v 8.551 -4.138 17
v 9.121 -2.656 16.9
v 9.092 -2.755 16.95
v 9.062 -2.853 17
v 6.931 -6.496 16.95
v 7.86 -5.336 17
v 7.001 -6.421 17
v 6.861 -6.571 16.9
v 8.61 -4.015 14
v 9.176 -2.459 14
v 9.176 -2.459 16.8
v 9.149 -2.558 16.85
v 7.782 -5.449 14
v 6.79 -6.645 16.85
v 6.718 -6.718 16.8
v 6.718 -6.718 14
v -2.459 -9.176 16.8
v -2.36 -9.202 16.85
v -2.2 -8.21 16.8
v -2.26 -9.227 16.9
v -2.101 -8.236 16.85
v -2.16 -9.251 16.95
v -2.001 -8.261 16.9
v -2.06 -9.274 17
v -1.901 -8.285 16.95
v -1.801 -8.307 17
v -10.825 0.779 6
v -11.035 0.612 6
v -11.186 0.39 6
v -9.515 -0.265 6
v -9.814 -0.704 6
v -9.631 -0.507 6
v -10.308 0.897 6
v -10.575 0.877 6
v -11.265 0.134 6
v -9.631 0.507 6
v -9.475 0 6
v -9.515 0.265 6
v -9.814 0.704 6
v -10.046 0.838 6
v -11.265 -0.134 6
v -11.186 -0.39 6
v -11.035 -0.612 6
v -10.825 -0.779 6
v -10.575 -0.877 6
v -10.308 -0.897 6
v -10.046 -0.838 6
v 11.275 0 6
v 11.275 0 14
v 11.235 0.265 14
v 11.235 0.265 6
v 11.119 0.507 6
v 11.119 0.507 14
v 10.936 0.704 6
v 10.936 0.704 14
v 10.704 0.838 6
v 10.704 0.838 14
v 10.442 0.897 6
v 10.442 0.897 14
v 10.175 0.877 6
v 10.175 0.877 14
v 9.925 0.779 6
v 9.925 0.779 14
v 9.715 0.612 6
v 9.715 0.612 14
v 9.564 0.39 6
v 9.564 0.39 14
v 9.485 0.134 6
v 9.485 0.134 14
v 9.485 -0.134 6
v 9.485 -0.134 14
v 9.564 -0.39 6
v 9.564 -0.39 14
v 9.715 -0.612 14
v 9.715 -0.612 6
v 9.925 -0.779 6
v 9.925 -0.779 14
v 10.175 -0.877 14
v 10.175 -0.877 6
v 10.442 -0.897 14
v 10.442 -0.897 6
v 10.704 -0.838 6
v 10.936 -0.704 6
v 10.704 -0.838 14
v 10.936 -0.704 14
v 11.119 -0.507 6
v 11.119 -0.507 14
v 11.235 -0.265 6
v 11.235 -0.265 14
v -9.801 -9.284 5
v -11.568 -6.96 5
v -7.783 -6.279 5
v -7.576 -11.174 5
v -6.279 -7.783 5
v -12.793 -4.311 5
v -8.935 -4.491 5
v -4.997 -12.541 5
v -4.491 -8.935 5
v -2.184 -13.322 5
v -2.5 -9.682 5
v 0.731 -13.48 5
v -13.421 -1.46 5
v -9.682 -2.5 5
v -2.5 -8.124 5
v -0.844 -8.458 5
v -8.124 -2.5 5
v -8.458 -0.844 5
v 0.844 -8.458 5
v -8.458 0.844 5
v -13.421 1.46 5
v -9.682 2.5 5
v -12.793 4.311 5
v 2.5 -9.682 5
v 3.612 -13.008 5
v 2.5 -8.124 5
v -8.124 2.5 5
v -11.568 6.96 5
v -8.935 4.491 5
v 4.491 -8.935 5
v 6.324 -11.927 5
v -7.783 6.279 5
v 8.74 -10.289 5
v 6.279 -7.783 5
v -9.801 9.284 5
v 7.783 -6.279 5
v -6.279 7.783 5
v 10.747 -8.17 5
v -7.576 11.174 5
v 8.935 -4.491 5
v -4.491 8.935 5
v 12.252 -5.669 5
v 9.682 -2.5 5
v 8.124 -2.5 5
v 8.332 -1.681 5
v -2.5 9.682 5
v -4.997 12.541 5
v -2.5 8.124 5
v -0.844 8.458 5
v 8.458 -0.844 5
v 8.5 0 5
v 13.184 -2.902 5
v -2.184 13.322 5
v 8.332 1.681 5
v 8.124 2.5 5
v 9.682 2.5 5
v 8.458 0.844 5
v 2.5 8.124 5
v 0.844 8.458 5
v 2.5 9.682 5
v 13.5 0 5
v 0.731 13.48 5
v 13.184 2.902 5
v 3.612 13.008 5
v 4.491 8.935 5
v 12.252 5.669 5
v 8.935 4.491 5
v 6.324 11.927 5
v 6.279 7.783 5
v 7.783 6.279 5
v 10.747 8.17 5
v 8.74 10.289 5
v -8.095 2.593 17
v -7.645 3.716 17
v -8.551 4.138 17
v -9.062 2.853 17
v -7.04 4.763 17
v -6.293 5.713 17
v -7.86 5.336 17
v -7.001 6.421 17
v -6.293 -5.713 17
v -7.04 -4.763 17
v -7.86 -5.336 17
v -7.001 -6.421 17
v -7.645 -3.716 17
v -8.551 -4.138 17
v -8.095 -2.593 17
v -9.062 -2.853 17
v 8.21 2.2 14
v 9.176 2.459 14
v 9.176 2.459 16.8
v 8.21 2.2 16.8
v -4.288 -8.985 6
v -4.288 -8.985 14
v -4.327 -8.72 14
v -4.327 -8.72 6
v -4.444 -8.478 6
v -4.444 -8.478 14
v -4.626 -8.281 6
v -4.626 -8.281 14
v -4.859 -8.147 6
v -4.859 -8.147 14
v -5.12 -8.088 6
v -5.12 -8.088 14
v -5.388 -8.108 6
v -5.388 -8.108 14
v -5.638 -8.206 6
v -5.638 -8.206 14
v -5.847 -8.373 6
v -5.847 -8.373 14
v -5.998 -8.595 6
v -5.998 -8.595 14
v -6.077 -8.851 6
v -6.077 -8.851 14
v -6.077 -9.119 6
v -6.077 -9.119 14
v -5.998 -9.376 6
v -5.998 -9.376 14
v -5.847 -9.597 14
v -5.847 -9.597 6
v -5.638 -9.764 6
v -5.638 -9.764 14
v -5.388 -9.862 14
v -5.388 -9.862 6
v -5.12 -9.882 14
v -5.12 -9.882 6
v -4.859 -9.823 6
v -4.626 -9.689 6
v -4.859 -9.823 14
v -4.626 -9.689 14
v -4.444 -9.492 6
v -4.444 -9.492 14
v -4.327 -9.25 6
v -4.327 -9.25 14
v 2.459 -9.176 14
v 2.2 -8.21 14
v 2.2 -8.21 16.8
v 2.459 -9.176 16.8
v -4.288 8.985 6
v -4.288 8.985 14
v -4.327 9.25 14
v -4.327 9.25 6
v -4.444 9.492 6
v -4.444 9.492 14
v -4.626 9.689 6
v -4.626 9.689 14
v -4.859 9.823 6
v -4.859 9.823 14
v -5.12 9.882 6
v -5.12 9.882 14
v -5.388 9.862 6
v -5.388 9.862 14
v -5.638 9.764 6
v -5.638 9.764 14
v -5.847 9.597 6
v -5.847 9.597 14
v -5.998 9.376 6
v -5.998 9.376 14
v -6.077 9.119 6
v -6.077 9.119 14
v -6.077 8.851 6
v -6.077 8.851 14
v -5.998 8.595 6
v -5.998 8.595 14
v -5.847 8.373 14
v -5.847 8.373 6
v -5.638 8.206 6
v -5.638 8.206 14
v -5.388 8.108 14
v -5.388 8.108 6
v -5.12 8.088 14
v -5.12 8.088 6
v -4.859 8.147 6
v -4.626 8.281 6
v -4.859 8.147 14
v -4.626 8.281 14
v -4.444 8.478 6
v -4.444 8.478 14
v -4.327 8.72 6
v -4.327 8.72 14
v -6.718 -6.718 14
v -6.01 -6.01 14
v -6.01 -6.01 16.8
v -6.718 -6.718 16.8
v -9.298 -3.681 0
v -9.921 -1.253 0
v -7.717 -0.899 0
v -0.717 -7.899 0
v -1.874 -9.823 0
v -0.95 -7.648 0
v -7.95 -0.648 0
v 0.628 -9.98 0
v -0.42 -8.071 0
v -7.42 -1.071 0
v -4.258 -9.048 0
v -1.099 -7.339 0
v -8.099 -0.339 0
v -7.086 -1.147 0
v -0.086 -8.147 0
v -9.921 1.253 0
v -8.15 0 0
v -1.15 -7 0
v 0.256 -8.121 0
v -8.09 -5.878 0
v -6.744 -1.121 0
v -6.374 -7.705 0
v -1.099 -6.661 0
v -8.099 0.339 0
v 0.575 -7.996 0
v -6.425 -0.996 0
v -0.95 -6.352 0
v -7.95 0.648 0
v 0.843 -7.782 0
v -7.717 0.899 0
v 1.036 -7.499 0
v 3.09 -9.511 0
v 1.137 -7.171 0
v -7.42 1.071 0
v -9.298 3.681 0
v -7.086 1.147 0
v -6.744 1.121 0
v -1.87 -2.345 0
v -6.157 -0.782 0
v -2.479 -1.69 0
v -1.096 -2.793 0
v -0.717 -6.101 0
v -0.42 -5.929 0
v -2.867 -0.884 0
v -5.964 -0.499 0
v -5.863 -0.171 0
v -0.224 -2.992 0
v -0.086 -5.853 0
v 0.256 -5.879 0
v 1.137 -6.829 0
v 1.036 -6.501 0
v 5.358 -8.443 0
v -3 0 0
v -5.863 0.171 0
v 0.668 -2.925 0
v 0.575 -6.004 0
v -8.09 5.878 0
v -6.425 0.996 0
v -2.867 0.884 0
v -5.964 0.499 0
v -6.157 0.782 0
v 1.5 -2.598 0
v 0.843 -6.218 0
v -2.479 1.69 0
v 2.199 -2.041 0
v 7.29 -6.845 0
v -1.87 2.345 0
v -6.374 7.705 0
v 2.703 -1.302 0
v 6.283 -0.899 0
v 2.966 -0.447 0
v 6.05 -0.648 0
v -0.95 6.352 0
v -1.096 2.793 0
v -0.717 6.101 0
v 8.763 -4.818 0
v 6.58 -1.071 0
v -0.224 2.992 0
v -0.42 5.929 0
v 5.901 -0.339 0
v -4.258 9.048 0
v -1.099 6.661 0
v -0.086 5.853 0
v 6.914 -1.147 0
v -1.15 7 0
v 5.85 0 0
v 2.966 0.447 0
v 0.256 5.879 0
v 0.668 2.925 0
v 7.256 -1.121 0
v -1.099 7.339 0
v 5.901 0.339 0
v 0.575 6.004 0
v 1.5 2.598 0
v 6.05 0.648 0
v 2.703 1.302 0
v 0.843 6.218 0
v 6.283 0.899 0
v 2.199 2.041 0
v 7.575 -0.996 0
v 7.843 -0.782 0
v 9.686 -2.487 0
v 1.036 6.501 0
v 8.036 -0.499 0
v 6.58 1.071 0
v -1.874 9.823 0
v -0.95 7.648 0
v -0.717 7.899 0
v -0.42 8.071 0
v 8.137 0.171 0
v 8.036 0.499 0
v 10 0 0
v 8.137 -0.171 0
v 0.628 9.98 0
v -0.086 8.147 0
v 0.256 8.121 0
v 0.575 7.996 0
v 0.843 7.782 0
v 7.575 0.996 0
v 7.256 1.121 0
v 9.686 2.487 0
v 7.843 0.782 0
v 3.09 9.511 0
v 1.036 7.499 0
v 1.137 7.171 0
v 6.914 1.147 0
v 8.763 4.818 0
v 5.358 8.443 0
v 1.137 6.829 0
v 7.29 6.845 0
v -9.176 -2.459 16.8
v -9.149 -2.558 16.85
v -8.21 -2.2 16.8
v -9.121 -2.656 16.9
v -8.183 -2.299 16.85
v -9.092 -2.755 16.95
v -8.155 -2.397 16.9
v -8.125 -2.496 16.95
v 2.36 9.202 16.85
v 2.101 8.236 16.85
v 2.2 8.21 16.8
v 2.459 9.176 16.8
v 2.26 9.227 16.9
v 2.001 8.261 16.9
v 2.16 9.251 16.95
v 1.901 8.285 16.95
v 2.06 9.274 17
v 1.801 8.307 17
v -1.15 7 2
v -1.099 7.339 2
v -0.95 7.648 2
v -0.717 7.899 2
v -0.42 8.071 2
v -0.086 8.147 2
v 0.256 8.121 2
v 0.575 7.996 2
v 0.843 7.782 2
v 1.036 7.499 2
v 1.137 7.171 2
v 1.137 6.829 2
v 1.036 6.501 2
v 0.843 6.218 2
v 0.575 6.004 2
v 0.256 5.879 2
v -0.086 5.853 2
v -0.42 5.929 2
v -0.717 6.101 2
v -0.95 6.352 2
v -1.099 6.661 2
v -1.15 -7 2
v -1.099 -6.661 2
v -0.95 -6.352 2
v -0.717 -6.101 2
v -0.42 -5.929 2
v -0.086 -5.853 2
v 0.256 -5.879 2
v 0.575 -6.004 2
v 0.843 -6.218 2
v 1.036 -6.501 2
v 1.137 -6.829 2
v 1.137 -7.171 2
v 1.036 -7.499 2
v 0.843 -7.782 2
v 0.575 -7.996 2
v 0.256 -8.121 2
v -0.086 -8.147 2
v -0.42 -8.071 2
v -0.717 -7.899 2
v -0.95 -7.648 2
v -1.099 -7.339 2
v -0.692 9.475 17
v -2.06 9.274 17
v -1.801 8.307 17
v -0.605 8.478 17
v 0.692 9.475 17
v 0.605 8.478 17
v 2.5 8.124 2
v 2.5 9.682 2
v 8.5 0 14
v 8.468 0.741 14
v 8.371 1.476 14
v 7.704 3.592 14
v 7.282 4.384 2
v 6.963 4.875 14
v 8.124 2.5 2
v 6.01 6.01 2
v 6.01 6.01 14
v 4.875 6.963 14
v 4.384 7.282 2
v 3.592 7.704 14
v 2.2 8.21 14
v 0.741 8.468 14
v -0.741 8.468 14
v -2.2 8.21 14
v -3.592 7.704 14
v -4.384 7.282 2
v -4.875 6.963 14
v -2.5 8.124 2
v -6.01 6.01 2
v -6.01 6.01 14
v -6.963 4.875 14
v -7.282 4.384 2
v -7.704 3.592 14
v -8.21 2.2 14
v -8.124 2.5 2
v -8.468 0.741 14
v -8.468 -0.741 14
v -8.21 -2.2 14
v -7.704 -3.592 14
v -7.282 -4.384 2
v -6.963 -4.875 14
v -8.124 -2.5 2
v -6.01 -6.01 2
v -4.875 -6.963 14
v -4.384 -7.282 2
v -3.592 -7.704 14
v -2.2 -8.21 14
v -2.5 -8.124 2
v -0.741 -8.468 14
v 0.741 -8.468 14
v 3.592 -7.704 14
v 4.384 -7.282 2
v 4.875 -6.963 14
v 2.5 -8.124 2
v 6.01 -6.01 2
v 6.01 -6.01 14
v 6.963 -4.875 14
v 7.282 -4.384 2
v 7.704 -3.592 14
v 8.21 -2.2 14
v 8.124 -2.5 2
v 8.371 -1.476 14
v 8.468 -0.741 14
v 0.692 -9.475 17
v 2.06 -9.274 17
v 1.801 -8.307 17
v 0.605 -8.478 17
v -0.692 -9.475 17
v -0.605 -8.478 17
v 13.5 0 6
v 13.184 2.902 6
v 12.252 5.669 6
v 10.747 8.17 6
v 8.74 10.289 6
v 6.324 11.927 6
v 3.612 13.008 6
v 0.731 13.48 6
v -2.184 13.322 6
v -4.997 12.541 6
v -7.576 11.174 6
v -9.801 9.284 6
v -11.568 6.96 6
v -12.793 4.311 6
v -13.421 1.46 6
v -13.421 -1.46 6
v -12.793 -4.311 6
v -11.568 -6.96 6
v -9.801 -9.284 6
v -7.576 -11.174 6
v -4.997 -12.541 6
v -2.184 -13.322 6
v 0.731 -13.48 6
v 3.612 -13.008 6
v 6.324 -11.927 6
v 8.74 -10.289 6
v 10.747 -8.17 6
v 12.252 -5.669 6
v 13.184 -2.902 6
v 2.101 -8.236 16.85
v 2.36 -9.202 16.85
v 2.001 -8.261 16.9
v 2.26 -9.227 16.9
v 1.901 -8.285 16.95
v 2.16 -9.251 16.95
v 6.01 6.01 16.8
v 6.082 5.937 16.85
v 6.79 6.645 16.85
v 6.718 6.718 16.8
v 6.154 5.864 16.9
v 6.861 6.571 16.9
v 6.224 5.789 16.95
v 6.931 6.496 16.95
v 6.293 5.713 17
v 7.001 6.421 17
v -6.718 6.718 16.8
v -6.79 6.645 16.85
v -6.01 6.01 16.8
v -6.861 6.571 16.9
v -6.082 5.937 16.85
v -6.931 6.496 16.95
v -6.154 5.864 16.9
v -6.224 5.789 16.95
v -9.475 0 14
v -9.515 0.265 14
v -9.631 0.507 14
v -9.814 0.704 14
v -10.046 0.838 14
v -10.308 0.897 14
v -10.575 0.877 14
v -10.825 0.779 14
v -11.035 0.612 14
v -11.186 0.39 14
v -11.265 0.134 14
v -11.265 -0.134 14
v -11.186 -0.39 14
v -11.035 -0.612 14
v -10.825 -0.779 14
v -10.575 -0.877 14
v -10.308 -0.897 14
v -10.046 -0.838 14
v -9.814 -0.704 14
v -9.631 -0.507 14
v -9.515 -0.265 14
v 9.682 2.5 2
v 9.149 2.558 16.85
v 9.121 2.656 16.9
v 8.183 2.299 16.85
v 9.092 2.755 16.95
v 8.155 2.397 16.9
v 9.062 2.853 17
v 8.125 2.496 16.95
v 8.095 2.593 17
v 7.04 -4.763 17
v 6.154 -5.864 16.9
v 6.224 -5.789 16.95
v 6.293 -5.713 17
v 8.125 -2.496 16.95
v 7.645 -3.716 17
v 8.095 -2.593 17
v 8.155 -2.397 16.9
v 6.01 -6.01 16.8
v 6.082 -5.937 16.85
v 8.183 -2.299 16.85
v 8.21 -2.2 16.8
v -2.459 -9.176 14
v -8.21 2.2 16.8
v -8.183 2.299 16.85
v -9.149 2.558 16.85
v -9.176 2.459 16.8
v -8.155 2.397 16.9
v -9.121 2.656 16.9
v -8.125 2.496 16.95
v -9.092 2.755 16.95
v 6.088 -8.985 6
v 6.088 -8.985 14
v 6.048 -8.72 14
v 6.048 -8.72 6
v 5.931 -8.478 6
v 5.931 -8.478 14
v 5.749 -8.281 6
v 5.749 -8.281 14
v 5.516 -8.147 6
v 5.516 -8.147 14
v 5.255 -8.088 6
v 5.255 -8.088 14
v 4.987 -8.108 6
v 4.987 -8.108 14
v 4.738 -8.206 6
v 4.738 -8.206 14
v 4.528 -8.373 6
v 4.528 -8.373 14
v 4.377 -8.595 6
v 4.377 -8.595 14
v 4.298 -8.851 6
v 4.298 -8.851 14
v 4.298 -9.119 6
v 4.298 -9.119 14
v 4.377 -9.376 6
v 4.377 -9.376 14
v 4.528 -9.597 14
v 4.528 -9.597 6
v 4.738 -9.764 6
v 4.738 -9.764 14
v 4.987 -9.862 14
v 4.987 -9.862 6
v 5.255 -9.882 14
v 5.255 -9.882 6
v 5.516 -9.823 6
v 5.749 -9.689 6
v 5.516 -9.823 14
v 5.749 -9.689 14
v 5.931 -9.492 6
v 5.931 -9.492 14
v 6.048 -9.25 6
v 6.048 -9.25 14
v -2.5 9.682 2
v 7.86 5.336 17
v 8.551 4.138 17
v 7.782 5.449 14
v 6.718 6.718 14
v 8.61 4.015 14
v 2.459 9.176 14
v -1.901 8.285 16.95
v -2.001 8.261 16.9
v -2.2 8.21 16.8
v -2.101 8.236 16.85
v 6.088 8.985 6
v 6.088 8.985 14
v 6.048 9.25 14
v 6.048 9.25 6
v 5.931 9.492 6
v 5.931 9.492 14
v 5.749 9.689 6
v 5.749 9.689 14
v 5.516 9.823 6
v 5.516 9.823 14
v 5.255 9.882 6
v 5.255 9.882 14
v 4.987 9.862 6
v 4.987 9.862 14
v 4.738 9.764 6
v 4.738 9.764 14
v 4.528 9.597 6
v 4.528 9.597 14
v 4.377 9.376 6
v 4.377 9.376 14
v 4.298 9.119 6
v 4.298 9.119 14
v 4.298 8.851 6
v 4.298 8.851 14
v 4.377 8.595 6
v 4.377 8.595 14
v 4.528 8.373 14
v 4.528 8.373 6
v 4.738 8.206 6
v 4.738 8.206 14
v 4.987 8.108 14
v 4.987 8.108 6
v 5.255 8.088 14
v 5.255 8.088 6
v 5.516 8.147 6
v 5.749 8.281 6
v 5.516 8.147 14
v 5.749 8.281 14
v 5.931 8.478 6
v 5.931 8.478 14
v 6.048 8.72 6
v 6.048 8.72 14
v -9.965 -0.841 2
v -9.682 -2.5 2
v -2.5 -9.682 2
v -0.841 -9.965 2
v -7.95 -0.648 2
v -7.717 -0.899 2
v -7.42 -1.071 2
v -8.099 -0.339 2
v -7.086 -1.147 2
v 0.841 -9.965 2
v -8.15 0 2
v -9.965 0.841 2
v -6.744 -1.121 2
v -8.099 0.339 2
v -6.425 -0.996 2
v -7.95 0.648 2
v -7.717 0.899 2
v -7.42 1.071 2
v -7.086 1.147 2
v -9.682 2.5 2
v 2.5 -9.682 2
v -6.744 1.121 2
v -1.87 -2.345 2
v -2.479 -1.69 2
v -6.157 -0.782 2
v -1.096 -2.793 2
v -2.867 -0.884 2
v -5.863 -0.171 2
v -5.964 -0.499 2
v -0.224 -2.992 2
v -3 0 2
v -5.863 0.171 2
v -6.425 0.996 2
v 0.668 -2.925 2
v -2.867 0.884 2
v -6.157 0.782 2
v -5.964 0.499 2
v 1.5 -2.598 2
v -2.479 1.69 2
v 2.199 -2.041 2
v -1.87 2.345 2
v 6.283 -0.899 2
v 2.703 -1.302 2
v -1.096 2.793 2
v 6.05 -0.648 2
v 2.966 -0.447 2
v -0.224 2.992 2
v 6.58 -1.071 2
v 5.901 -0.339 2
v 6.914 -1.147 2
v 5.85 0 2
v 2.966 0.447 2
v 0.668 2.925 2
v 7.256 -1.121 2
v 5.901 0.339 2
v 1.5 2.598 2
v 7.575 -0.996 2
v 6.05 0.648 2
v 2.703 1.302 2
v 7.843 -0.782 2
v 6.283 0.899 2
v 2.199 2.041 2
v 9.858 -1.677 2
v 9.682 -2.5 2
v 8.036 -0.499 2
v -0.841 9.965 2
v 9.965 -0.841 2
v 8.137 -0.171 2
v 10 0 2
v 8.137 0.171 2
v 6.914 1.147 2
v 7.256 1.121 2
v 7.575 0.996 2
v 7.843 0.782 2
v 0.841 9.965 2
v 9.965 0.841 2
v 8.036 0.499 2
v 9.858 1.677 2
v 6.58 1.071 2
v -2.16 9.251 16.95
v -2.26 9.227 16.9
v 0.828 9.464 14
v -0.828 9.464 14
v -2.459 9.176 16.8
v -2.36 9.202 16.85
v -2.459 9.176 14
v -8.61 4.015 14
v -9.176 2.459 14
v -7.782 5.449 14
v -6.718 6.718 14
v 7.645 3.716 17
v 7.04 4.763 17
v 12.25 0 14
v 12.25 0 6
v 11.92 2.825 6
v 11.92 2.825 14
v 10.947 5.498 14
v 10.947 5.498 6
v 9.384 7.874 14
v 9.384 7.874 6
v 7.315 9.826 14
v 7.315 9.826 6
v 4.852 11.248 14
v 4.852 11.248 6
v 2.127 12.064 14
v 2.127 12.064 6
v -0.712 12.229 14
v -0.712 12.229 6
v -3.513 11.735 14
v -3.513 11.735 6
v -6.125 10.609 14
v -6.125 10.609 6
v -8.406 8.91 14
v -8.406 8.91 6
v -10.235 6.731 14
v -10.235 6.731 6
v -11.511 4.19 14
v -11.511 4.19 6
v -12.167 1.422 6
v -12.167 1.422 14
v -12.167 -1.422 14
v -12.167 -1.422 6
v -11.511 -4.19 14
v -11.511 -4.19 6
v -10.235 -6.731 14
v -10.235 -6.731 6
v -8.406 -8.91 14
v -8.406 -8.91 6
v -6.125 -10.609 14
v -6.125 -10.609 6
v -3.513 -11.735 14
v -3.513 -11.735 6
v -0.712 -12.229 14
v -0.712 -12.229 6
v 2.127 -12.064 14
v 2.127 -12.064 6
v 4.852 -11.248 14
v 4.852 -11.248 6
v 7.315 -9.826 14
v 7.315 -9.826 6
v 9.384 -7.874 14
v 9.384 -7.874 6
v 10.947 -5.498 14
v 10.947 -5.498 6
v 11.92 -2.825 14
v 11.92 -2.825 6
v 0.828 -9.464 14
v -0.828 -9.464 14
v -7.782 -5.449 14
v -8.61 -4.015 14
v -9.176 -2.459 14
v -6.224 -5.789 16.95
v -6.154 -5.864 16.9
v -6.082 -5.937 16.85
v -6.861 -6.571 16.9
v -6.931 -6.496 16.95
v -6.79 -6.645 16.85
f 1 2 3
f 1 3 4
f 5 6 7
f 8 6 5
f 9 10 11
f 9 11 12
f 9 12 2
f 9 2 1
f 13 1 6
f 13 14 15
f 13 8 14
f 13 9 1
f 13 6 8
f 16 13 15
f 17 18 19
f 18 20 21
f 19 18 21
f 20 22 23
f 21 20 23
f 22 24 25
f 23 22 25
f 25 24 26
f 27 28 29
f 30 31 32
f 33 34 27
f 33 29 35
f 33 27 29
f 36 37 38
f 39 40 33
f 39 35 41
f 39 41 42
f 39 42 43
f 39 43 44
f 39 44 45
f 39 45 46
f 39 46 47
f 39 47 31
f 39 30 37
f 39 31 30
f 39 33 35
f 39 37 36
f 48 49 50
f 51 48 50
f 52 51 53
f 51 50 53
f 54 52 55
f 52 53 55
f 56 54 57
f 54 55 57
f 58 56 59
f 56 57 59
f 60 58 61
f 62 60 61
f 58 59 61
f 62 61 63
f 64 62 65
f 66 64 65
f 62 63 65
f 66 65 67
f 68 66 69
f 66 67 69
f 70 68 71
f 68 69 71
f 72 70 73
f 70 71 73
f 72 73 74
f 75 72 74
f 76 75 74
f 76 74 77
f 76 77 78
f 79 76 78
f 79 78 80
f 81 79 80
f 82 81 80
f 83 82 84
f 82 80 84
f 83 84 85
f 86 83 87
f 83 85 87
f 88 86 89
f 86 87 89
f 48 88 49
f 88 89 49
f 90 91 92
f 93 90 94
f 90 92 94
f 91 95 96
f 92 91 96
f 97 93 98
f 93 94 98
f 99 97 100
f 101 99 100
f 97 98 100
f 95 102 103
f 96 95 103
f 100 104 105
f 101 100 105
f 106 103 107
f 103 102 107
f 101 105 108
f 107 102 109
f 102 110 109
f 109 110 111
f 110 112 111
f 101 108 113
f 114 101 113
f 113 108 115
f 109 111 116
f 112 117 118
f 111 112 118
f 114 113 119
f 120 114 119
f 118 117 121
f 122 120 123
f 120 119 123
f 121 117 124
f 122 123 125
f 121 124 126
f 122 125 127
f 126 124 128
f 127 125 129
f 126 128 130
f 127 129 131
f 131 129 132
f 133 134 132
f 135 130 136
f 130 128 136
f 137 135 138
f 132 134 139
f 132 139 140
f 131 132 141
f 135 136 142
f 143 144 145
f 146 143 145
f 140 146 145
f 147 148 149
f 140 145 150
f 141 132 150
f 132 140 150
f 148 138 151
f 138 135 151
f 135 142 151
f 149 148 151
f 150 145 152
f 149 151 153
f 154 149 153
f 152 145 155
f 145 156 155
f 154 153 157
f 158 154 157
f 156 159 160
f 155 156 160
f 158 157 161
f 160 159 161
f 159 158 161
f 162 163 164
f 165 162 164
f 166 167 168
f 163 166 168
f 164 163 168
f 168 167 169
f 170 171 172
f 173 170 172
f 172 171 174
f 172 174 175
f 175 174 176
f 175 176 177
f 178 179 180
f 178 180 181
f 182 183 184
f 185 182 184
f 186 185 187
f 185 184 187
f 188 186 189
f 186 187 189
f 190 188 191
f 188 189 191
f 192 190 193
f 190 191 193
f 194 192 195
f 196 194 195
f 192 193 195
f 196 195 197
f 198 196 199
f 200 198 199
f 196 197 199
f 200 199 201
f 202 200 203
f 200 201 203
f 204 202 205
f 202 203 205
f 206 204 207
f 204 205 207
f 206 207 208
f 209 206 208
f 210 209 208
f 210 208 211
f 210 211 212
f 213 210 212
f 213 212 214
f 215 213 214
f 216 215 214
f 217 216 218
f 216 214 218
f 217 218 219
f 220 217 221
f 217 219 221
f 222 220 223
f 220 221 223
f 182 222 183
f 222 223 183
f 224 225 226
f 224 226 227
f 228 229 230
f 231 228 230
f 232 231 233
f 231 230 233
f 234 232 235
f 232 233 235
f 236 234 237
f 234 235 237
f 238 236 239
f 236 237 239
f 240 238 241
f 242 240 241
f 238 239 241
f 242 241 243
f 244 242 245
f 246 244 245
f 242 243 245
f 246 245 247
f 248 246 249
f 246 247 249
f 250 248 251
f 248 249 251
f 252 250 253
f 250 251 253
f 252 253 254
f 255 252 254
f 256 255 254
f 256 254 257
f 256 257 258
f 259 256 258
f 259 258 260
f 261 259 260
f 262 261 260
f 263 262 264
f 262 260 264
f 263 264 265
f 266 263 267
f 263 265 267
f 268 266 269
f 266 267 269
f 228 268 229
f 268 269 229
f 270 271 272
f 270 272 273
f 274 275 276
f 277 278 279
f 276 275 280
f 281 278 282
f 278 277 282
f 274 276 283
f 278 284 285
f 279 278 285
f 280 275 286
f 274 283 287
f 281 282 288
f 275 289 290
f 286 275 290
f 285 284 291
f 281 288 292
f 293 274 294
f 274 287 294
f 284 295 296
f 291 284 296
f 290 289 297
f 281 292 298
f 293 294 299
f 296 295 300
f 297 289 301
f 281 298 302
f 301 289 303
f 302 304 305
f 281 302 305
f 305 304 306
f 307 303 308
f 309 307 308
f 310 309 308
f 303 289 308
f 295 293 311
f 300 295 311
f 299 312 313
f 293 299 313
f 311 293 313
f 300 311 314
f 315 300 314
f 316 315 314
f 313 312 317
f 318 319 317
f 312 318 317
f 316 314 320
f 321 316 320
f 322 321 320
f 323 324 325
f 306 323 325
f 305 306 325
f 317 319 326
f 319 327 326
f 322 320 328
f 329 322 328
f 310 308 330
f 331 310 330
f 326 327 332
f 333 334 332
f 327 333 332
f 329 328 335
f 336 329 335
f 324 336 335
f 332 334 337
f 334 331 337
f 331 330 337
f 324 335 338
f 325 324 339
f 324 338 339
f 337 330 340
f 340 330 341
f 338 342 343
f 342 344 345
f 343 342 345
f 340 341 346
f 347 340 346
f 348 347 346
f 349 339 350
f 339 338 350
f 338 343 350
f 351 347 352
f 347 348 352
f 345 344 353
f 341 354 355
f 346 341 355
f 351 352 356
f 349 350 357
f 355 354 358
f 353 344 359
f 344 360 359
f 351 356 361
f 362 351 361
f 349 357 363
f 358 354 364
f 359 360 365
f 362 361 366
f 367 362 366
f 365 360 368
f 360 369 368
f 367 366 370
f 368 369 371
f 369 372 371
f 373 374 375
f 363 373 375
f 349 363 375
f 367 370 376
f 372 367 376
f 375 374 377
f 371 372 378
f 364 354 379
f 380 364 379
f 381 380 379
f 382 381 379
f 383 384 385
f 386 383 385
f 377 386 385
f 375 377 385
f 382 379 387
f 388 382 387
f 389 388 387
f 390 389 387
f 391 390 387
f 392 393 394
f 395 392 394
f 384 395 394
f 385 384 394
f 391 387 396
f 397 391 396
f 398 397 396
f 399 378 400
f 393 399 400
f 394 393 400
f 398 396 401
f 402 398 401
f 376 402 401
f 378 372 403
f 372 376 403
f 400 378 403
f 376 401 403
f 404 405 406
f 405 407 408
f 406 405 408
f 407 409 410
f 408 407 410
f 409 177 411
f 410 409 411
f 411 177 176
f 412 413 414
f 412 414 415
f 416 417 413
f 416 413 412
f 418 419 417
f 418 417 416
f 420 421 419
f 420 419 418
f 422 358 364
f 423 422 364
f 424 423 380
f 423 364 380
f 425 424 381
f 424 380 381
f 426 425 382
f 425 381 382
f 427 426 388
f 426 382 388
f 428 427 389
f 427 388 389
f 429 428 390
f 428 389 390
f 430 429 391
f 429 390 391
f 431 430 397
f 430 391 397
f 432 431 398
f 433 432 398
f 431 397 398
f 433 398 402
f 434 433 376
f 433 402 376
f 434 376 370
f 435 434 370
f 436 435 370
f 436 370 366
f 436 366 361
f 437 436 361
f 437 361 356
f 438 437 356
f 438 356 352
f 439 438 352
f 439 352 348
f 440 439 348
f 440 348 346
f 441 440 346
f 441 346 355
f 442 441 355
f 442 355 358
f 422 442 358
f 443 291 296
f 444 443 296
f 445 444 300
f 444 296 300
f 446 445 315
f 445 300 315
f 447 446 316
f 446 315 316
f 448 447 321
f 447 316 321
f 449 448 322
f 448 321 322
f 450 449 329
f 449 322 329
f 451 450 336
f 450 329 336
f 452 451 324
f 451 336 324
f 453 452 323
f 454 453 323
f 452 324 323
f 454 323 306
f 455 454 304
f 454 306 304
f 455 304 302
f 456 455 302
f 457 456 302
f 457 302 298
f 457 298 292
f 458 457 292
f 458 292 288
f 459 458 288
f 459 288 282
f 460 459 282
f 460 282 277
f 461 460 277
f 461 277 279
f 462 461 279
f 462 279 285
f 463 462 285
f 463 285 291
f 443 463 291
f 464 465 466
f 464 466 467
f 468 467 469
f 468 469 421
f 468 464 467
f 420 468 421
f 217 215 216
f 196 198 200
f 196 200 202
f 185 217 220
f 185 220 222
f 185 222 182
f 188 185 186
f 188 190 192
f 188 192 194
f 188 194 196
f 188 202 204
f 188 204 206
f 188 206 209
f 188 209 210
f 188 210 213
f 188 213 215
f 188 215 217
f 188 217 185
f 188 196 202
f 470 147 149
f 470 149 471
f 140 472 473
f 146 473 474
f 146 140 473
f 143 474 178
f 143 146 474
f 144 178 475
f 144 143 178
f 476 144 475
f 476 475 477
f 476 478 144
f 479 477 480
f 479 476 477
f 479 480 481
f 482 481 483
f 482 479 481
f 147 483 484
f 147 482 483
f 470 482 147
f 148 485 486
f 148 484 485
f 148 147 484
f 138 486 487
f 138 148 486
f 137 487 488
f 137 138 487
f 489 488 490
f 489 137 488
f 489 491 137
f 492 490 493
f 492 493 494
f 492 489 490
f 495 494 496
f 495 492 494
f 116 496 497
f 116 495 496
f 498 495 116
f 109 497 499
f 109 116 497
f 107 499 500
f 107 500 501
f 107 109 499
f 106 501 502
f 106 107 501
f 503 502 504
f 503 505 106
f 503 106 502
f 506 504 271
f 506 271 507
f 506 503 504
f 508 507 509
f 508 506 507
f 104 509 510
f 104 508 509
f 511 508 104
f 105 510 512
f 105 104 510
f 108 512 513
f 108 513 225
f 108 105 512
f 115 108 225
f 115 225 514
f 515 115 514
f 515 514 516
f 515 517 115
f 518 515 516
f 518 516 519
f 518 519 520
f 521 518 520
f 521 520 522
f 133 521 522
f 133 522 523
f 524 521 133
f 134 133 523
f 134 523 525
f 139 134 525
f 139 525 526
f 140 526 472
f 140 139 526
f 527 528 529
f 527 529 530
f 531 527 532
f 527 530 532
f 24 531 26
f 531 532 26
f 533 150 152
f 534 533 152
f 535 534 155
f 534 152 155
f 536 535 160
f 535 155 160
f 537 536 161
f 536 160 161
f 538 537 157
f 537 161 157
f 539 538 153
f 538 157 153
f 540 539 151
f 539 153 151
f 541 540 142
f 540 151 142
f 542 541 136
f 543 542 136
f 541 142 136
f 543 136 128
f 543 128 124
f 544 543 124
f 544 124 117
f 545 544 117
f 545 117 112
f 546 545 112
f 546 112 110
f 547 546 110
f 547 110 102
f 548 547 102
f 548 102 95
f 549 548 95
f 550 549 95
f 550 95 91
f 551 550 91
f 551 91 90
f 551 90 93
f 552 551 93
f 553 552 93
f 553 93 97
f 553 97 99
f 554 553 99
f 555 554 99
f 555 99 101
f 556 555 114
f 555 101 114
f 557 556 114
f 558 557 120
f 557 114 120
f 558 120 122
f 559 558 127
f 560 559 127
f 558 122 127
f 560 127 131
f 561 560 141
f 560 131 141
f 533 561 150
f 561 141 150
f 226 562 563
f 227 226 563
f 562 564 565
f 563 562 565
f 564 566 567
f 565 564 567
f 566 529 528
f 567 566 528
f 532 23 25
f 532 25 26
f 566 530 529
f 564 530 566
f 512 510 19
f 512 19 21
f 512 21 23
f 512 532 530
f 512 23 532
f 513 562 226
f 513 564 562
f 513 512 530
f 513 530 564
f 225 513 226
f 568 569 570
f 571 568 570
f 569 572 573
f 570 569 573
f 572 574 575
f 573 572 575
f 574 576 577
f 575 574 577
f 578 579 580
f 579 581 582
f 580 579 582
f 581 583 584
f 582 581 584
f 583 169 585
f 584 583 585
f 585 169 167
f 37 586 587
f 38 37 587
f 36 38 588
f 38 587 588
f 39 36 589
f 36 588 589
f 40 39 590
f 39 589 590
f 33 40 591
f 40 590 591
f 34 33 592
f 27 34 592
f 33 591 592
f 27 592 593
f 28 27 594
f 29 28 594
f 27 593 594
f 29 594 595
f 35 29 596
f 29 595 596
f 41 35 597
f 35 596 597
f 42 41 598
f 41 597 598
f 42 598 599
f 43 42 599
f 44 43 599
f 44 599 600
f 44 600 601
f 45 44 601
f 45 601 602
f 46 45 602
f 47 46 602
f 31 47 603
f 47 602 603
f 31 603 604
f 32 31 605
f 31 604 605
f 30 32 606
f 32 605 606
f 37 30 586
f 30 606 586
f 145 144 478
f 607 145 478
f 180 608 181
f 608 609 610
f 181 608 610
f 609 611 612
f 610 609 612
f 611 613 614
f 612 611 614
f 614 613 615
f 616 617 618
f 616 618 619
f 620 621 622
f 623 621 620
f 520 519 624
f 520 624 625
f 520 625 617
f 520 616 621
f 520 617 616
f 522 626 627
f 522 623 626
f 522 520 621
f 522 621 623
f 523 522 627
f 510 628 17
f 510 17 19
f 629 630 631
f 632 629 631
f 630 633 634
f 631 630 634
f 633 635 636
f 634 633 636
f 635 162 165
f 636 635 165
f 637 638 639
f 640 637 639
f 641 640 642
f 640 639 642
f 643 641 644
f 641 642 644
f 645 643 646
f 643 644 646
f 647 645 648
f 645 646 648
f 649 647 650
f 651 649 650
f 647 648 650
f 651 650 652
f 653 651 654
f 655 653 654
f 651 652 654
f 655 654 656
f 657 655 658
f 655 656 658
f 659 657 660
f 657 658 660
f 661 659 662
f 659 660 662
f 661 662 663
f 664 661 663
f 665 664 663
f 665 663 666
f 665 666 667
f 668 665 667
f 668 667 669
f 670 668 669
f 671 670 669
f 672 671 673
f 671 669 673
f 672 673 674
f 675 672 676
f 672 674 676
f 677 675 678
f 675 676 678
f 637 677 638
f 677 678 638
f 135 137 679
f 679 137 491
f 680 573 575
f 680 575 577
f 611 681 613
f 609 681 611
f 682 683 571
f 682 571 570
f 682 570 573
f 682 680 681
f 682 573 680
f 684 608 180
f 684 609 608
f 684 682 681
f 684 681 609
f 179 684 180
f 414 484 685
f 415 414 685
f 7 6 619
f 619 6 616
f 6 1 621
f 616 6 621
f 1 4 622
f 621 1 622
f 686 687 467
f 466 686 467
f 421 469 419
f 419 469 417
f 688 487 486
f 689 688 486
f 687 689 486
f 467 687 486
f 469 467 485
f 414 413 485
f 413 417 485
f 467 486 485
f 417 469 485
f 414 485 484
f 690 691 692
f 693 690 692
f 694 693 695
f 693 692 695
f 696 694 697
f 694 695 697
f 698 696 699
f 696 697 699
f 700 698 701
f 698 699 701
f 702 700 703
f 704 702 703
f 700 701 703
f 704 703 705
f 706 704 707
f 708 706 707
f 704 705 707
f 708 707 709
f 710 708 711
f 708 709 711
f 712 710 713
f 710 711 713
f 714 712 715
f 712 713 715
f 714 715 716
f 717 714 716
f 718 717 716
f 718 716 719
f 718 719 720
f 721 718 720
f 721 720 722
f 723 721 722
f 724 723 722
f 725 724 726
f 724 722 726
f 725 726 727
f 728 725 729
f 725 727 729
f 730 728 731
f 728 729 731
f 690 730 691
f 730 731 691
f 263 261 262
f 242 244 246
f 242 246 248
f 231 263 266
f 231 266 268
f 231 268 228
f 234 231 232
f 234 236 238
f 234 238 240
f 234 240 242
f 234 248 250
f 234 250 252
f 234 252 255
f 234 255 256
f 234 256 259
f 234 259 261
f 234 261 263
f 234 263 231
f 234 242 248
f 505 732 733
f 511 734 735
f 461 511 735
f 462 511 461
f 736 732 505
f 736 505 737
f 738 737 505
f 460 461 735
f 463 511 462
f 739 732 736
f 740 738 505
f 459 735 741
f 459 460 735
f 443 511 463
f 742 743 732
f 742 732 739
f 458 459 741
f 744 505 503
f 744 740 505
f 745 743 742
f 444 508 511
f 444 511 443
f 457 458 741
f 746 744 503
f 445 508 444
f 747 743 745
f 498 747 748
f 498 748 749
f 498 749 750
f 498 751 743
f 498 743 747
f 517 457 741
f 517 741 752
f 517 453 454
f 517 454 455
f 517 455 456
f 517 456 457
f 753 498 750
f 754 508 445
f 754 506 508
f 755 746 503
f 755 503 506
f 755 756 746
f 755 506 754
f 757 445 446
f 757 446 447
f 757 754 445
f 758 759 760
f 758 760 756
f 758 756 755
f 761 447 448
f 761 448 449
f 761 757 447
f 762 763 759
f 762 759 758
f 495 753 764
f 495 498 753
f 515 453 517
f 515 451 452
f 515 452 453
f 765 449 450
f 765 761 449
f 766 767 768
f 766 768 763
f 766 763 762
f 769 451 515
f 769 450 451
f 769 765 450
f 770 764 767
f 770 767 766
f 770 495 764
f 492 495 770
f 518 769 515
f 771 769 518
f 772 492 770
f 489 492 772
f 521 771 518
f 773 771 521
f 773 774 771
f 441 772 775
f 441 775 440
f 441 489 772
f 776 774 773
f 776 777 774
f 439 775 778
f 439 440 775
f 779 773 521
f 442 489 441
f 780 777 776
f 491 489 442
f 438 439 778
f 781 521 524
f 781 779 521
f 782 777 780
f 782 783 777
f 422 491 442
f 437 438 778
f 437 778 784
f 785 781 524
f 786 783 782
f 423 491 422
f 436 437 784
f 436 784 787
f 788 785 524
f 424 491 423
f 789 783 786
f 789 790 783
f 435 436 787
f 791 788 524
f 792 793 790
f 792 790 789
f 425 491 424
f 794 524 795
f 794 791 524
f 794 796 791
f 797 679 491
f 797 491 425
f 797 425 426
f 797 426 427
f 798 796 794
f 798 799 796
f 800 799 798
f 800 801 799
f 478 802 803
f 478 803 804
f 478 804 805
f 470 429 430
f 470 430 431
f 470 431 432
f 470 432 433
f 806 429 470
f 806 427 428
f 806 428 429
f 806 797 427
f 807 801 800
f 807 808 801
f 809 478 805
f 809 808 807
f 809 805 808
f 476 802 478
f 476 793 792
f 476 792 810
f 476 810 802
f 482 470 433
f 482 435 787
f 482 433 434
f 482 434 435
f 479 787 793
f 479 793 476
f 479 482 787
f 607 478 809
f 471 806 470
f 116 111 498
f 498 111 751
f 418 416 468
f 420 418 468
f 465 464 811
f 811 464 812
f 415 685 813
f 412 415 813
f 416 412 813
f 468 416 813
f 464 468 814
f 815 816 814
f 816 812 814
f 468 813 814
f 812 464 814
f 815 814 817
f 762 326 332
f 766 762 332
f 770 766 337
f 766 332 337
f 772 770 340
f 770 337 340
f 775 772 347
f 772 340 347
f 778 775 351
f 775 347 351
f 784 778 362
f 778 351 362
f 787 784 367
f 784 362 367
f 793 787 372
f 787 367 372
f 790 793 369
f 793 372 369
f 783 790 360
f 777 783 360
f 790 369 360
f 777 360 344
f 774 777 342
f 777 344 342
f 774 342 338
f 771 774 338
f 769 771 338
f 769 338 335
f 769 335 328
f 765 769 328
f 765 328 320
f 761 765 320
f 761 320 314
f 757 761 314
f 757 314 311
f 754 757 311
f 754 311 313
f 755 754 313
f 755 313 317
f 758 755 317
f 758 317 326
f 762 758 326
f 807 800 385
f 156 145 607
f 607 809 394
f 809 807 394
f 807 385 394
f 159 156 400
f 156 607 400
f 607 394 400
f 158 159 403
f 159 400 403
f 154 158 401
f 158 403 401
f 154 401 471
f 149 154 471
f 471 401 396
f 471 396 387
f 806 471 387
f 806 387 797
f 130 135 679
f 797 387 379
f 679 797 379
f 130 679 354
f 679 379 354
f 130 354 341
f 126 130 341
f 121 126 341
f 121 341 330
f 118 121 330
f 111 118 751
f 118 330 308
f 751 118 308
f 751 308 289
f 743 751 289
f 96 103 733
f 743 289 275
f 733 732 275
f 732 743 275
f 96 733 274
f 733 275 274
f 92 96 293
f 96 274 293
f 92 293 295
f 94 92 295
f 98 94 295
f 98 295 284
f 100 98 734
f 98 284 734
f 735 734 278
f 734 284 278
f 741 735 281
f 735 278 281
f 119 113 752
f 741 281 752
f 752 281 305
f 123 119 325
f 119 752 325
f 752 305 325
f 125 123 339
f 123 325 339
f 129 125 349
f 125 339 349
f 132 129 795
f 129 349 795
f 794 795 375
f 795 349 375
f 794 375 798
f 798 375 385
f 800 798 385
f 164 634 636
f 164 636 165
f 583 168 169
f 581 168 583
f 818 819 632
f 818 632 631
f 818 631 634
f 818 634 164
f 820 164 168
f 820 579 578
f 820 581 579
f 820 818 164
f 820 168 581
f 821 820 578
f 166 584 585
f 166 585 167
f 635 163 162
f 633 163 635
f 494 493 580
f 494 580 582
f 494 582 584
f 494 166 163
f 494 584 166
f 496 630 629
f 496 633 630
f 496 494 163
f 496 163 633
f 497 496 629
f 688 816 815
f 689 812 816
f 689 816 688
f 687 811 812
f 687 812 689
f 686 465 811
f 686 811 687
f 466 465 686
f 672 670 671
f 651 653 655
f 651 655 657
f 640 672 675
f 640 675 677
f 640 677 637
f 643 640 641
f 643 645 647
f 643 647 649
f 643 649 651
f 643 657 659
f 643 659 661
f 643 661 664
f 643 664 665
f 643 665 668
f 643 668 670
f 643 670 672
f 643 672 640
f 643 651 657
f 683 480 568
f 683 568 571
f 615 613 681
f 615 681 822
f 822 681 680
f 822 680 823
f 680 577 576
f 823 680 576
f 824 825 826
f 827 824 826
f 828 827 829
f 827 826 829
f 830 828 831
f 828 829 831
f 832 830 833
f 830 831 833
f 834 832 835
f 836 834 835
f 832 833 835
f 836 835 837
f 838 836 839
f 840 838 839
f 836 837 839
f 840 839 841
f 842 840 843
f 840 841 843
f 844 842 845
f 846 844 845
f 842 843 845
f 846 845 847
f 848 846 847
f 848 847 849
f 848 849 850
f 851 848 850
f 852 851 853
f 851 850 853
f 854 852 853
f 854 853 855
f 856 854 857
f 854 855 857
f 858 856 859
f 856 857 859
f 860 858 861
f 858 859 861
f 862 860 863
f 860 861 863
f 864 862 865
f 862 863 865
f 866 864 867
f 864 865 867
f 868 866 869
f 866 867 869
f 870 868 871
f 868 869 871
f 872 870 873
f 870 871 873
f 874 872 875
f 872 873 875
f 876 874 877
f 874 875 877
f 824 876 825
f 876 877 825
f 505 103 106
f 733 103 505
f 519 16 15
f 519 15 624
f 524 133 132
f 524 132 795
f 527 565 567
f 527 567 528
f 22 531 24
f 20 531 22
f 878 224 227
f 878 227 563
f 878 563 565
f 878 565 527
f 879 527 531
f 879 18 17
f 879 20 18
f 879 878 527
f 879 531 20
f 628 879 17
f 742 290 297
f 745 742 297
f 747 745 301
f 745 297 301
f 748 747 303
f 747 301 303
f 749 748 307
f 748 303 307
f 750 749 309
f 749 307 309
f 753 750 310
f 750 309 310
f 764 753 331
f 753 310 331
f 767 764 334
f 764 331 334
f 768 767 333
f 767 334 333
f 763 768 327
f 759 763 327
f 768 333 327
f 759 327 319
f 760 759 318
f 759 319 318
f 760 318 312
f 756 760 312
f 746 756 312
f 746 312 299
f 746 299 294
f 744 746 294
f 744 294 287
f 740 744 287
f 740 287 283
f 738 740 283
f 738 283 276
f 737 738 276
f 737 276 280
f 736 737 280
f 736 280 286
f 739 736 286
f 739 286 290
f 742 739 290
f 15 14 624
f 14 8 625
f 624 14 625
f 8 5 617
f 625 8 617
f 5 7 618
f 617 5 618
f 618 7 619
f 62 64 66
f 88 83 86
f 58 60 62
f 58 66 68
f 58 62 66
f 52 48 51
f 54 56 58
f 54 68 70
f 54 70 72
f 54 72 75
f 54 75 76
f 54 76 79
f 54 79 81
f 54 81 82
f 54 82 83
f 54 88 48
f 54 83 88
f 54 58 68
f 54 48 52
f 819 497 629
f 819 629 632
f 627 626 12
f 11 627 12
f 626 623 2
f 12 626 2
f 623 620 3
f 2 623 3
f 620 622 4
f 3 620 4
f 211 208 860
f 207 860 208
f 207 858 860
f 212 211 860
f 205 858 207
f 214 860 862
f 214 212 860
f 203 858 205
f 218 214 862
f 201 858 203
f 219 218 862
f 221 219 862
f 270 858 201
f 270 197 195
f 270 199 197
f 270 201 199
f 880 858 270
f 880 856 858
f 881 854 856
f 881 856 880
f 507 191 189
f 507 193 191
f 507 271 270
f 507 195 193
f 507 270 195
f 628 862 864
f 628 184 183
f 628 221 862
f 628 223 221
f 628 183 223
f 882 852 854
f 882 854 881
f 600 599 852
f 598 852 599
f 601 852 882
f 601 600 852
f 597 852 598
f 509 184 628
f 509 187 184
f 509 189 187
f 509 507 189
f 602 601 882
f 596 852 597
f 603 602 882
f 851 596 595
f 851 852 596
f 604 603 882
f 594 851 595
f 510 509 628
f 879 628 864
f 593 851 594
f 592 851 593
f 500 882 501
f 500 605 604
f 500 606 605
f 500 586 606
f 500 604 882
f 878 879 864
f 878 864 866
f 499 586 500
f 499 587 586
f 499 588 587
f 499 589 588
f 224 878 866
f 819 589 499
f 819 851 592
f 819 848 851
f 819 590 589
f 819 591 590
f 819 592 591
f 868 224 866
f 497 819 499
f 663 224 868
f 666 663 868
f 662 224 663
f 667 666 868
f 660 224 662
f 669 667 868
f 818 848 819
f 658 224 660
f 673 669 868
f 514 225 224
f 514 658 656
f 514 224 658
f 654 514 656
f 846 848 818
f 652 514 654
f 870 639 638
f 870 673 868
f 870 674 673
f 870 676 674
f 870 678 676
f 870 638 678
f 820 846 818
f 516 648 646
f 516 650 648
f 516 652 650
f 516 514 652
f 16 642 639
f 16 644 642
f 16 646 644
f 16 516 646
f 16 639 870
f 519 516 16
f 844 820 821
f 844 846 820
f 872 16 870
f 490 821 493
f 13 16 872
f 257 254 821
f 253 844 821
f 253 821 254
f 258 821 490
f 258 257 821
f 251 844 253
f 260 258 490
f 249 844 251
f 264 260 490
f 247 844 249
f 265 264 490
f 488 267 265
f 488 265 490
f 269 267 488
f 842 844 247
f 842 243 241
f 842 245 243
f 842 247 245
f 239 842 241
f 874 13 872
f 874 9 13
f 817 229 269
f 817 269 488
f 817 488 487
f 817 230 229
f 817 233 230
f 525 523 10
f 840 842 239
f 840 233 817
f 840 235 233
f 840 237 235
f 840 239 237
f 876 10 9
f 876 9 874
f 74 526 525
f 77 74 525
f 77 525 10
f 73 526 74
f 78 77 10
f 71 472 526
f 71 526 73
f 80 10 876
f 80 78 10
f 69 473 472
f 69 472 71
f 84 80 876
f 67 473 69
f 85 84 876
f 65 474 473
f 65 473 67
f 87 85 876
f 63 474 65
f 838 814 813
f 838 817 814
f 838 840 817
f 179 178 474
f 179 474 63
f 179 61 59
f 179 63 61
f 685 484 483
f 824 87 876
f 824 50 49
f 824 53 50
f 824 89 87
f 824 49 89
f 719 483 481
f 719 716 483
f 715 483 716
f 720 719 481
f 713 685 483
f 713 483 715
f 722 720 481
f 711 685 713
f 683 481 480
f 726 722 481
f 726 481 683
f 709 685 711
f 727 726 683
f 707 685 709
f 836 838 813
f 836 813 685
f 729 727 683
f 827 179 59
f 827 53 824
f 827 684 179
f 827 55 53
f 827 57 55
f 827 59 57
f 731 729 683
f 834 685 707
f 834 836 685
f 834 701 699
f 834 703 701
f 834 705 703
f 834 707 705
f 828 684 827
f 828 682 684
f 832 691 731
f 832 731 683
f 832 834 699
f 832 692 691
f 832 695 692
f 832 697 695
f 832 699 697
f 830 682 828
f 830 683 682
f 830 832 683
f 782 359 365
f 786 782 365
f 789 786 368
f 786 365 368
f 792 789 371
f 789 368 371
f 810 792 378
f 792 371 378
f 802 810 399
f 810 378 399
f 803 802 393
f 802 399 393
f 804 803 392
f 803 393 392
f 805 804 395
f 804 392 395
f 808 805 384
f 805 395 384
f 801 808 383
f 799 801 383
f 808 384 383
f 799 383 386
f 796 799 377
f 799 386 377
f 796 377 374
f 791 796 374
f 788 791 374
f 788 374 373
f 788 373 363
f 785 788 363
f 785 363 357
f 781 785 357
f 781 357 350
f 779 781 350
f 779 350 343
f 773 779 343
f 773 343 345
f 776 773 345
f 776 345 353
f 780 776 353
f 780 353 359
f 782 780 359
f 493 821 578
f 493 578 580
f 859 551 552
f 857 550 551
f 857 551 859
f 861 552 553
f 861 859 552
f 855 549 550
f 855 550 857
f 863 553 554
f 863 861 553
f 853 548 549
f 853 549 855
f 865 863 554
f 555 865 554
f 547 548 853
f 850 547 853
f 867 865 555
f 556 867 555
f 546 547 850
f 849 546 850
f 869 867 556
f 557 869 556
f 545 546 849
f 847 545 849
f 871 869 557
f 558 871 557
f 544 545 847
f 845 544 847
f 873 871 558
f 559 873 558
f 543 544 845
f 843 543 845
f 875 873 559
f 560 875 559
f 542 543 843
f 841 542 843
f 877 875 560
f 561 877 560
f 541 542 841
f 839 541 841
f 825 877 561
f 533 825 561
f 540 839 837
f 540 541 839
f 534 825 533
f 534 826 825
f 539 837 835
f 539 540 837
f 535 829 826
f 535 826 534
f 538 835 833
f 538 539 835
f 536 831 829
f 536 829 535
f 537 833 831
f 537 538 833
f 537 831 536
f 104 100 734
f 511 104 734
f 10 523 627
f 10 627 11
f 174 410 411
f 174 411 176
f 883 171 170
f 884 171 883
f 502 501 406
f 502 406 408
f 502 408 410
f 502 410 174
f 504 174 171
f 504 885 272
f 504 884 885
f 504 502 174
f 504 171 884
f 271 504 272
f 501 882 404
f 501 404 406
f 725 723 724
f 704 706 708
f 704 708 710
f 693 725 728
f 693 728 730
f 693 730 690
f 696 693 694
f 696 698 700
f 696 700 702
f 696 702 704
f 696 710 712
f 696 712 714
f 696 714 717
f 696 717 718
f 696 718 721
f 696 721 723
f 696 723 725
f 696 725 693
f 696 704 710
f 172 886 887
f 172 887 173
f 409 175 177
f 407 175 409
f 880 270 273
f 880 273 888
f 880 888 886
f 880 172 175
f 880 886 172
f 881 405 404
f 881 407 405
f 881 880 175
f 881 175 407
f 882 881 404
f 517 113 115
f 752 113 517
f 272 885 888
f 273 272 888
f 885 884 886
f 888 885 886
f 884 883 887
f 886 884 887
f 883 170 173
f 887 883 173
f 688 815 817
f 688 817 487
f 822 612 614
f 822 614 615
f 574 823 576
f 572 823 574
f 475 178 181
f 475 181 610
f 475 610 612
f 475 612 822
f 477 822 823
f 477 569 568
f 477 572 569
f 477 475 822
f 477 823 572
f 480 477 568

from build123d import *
from OCP.BRepFilletAPI import BRepFilletAPI_MakeChamfer

# Parameters (mm, degrees)
SKETCH_1_R               = 10
EXTRUDE_1_DEPTH          = 2
SKETCH_2_R               = 10
SKETCH_2_R_2             = 8.5
EXTRUDE_2_DEPTH          = 3
SKETCH_4_R               = 13.5
SKETCH_4_R_2             = 8.5
EXTRUDE_3_DEPTH          = 1
SKETCH_5_R               = 12.25
SKETCH_5_R_2             = 8.5
EXTRUDE_4_DEPTH          = 8
SKETCH_6_R               = 0.9
CUT_EXTRUDE_1_DEPTH      = 8
SKETCH_7_R               = 3
SKETCH_7_R_2             = 1.15
CUT_EXTRUDE_2_DEPTH      = 24.674881204
CUT_EXTRUDE_3_DEPTH      = 24.674881204
CUT_EXTRUDE_3_DEPTH_BACK = 24.674881204
SKETCH_8_W               = 5
SKETCH_8_H               = 3
CUT_EXTRUDE_4_DEPTH      = 24.674881204
CUT_EXTRUDE_4_DEPTH_BACK = 24.674881204
SKETCH_9_W               = 3
SKETCH_9_H               = 5
EXTRUDE_5_DEPTH          = 3
CHAMFER_1_SIZE           = 0.2
CHAMFER_1_SIZE2          = 0.410060768


with BuildPart() as part:
    # 스케치1 → 보스-돌출1 (new body)
    with BuildSketch(Plane.XY):
        Circle(SKETCH_1_R)
    extrude(amount=EXTRUDE_1_DEPTH)

    # 스케치2 → 보스-돌출2 (add)
    with BuildSketch(Plane.XY.offset(2)):
        Circle(SKETCH_2_R)
        Circle(SKETCH_2_R_2, mode=Mode.SUBTRACT)
    extrude(amount=EXTRUDE_2_DEPTH)

    # 스케치4 → 보스-돌출3 (add)
    with BuildSketch(Plane.XY.offset(5)):
        Circle(SKETCH_4_R)
        Circle(SKETCH_4_R_2, mode=Mode.SUBTRACT)
    extrude(amount=EXTRUDE_3_DEPTH)

    # 스케치5 → 보스-돌출4 (add)
    with BuildSketch(Plane.XY.offset(6)):
        Circle(SKETCH_5_R)
        Circle(SKETCH_5_R_2, mode=Mode.SUBTRACT)
    extrude(amount=EXTRUDE_4_DEPTH)

    # 스케치6 → 컷-돌출1 (cut)
    with BuildSketch(Plane.XY.offset(14)):
        with Locations((10.375, 0)):
            Circle(SKETCH_6_R)
        with Locations((5.1875, -8.985013564)):
            Circle(SKETCH_6_R)
        with Locations((-5.1875, -8.985013564)):
            Circle(SKETCH_6_R)
        with Locations((-10.375, 0)):
            Circle(SKETCH_6_R)
        with Locations((-5.1875, 8.985013564)):
            Circle(SKETCH_6_R)
        with Locations((5.1875, 8.985013564)):
            Circle(SKETCH_6_R)
    extrude(amount=-CUT_EXTRUDE_1_DEPTH, mode=Mode.SUBTRACT)

    # 스케치7 → 컷-돌출2 (cut, through all)
    with BuildSketch(Plane(origin=(0, 0, 0), x_dir=(-1, 0, 0), z_dir=(0, 0, -1))):
        Circle(SKETCH_7_R)
        with Locations((-7, 0)):
            Circle(SKETCH_7_R_2)
        with Locations((7, 0)):
            Circle(SKETCH_7_R_2)
        with Locations((0, 7)):
            Circle(SKETCH_7_R_2)
        with Locations((0, -7)):
            Circle(SKETCH_7_R_2)
    extrude(amount=-CUT_EXTRUDE_2_DEPTH, mode=Mode.SUBTRACT)

    # 스케치8 → 컷-돌출3 (cut, two sides: drawn at the far end of the back side and taken through both)
    with BuildSketch(Plane(origin=(0, 0, 0), x_dir=(1, 0, 0), z_dir=(0, 1, 0)).offset(-CUT_EXTRUDE_3_DEPTH_BACK)):
        with Locations((0, -3.5)):
            Rectangle(SKETCH_8_W, SKETCH_8_H)
    extrude(amount=CUT_EXTRUDE_3_DEPTH + CUT_EXTRUDE_3_DEPTH_BACK, mode=Mode.SUBTRACT)

    # 스케치9 → 컷-돌출4 (cut, two sides: drawn at the far end of the back side and taken through both)
    with BuildSketch(Plane(origin=(0, 0, 0), x_dir=(0, 0, -1), z_dir=(1, 0, 0)).offset(-CUT_EXTRUDE_4_DEPTH_BACK)):
        with Locations((-3.5, 0)):
            Rectangle(SKETCH_9_W, SKETCH_9_H)
    extrude(amount=CUT_EXTRUDE_4_DEPTH + CUT_EXTRUDE_4_DEPTH_BACK, mode=Mode.SUBTRACT)

    # 스케치10 → 보스-돌출5 (add)
    with BuildSketch(Plane.XY.offset(14)):
        with BuildLine():
            Line((2.199961883, 8.210369523), (2.458780928, 9.17629535))
            ThreePointArc((2.458780928, 9.17629535), (0, 9.5), (-2.458780928, 9.17629535))
            Line((-2.458780928, 9.17629535), (-2.199961883, 8.210369523))
            ThreePointArc((-2.199961883, 8.210369523), (0, 8.5), (2.199961883, 8.210369523))
        make_face()
        with BuildLine():
            Line((6.01040764, 6.01040764), (6.717514421, 6.717514421))
            ThreePointArc((6.717514421, 6.717514421), (8.227241336, 4.75), (9.17629535, 2.458780928))
            Line((9.17629535, 2.458780928), (8.210369523, 2.199961883))
            ThreePointArc((8.210369523, 2.199961883), (7.361215932, 4.25), (6.01040764, 6.01040764))
        make_face()
        with BuildLine():
            Line((8.210369523, -2.199961883), (9.17629535, -2.458780928))
            ThreePointArc((9.17629535, -2.458780928), (8.227241336, -4.75), (6.717514421, -6.717514421))
            Line((6.717514421, -6.717514421), (6.01040764, -6.01040764))
            ThreePointArc((6.01040764, -6.01040764), (7.361215932, -4.25), (8.210369523, -2.199961883))
        make_face()
        with BuildLine():
            Line((2.199961883, -8.210369523), (2.458780928, -9.17629535))
            ThreePointArc((2.458780928, -9.17629535), (0, -9.5), (-2.458780928, -9.17629535))
            Line((-2.458780928, -9.17629535), (-2.199961883, -8.210369523))
            ThreePointArc((-2.199961883, -8.210369523), (0, -8.5), (2.199961883, -8.210369523))
        make_face()
        with BuildLine():
            Line((-6.01040764, -6.01040764), (-6.717514421, -6.717514421))
            ThreePointArc((-6.717514421, -6.717514421), (-8.227241336, -4.75), (-9.17629535, -2.458780928))
            Line((-9.17629535, -2.458780928), (-8.210369523, -2.199961883))
            ThreePointArc((-8.210369523, -2.199961883), (-7.361215932, -4.25), (-6.01040764, -6.01040764))
        make_face()
        with BuildLine():
            Line((-8.210369523, 2.199961883), (-9.17629535, 2.458780928))
            ThreePointArc((-9.17629535, 2.458780928), (-8.227241336, 4.75), (-6.717514421, 6.717514421))
            Line((-6.717514421, 6.717514421), (-6.01040764, 6.01040764))
            ThreePointArc((-6.01040764, 6.01040764), (-7.361215932, 4.25), (-8.210369523, 2.199961883))
        make_face()
    extrude(amount=EXTRUDE_5_DEPTH)

    # 모따기1: one chamfer whose edges measure the first distance from different faces: ONE call of the kernel's chamfer builder (chamfer() names one face for all edges)
    chamfer_1_edges_1 = [part.edges().sort_by_distance(p)[0] for p in [
        (-6.363961031, 6.363961031, 17),
    ]]
    chamfer_1_side_1 = [part.faces().sort_by_distance(p)[0] for p in [
        (-6.363961031, 6.363961031, 15.5),
    ]]
    chamfer_1_edges_2 = [part.edges().sort_by_distance(p)[0] for p in [
        (-8.693332437, 2.329371406, 17),
    ]]
    chamfer_1_side_2 = [part.faces().sort_by_distance(p)[0] for p in [
        (-8.693332437, 2.329371406, 15.5),
    ]]
    chamfer_1_edges_3 = [part.edges().sort_by_distance(p)[0] for p in [
        (-8.693332437, -2.329371406, 17),
    ]]
    chamfer_1_side_3 = [part.faces().sort_by_distance(p)[0] for p in [
        (-8.693332437, -2.329371406, 15.5),
    ]]
    chamfer_1_edges_4 = [part.edges().sort_by_distance(p)[0] for p in [
        (-6.363961031, -6.363961031, 17),
    ]]
    chamfer_1_side_4 = [part.faces().sort_by_distance(p)[0] for p in [
        (-6.363961031, -6.363961031, 15.5),
    ]]
    chamfer_1_edges_5 = [part.edges().sort_by_distance(p)[0] for p in [
        (-2.329371406, 8.693332437, 17),
    ]]
    chamfer_1_side_5 = [part.faces().sort_by_distance(p)[0] for p in [
        (-2.329371406, 8.693332437, 15.5),
    ]]
    chamfer_1_edges_6 = [part.edges().sort_by_distance(p)[0] for p in [
        (2.329371406, 8.693332437, 17),
    ]]
    chamfer_1_side_6 = [part.faces().sort_by_distance(p)[0] for p in [
        (2.329371406, 8.693332437, 15.5),
    ]]
    chamfer_1_edges_7 = [part.edges().sort_by_distance(p)[0] for p in [
        (-2.329371406, -8.693332437, 17),
    ]]
    chamfer_1_side_7 = [part.faces().sort_by_distance(p)[0] for p in [
        (-2.329371406, -8.693332437, 15.5),
    ]]
    chamfer_1_edges_8 = [part.edges().sort_by_distance(p)[0] for p in [
        (2.329371406, -8.693332437, 17),
    ]]
    chamfer_1_side_8 = [part.faces().sort_by_distance(p)[0] for p in [
        (2.329371406, -8.693332437, 15.5),
    ]]
    chamfer_1_edges_9 = [part.edges().sort_by_distance(p)[0] for p in [
        (6.363961031, 6.363961031, 17),
    ]]
    chamfer_1_side_9 = [part.faces().sort_by_distance(p)[0] for p in [
        (6.363961031, 6.363961031, 15.5),
    ]]
    chamfer_1_edges_10 = [part.edges().sort_by_distance(p)[0] for p in [
        (8.693332437, 2.329371406, 17),
    ]]
    chamfer_1_side_10 = [part.faces().sort_by_distance(p)[0] for p in [
        (8.693332437, 2.329371406, 15.5),
    ]]
    chamfer_1_edges_11 = [part.edges().sort_by_distance(p)[0] for p in [
        (6.363961031, -6.363961031, 17),
    ]]
    chamfer_1_side_11 = [part.faces().sort_by_distance(p)[0] for p in [
        (6.363961031, -6.363961031, 15.5),
    ]]
    chamfer_1_edges_12 = [part.edges().sort_by_distance(p)[0] for p in [
        (8.693332437, -2.329371406, 17),
    ]]
    chamfer_1_side_12 = [part.faces().sort_by_distance(p)[0] for p in [
        (8.693332437, -2.329371406, 15.5),
    ]]
    chamfer_1 = BRepFilletAPI_MakeChamfer(part.part.solid().wrapped)
    for e in chamfer_1_edges_1:
        chamfer_1.Add(CHAMFER_1_SIZE, CHAMFER_1_SIZE2, e.wrapped, chamfer_1_side_1[0].wrapped)  # the first distance lies on this face
    for e in chamfer_1_edges_2:
        chamfer_1.Add(CHAMFER_1_SIZE, CHAMFER_1_SIZE2, e.wrapped, chamfer_1_side_2[0].wrapped)  # the first distance lies on this face
    for e in chamfer_1_edges_3:
        chamfer_1.Add(CHAMFER_1_SIZE, CHAMFER_1_SIZE2, e.wrapped, chamfer_1_side_3[0].wrapped)  # the first distance lies on this face
    for e in chamfer_1_edges_4:
        chamfer_1.Add(CHAMFER_1_SIZE, CHAMFER_1_SIZE2, e.wrapped, chamfer_1_side_4[0].wrapped)  # the first distance lies on this face
    for e in chamfer_1_edges_5:
        chamfer_1.Add(CHAMFER_1_SIZE, CHAMFER_1_SIZE2, e.wrapped, chamfer_1_side_5[0].wrapped)  # the first distance lies on this face
    for e in chamfer_1_edges_6:
        chamfer_1.Add(CHAMFER_1_SIZE, CHAMFER_1_SIZE2, e.wrapped, chamfer_1_side_6[0].wrapped)  # the first distance lies on this face
    for e in chamfer_1_edges_7:
        chamfer_1.Add(CHAMFER_1_SIZE, CHAMFER_1_SIZE2, e.wrapped, chamfer_1_side_7[0].wrapped)  # the first distance lies on this face
    for e in chamfer_1_edges_8:
        chamfer_1.Add(CHAMFER_1_SIZE, CHAMFER_1_SIZE2, e.wrapped, chamfer_1_side_8[0].wrapped)  # the first distance lies on this face
    for e in chamfer_1_edges_9:
        chamfer_1.Add(CHAMFER_1_SIZE, CHAMFER_1_SIZE2, e.wrapped, chamfer_1_side_9[0].wrapped)  # the first distance lies on this face
    for e in chamfer_1_edges_10:
        chamfer_1.Add(CHAMFER_1_SIZE, CHAMFER_1_SIZE2, e.wrapped, chamfer_1_side_10[0].wrapped)  # the first distance lies on this face
    for e in chamfer_1_edges_11:
        chamfer_1.Add(CHAMFER_1_SIZE, CHAMFER_1_SIZE2, e.wrapped, chamfer_1_side_11[0].wrapped)  # the first distance lies on this face
    for e in chamfer_1_edges_12:
        chamfer_1.Add(CHAMFER_1_SIZE, CHAMFER_1_SIZE2, e.wrapped, chamfer_1_side_12[0].wrapped)  # the first distance lies on this face
    add(Compound.cast(chamfer_1.Shape()), mode=Mode.REPLACE)


solid = part.part
